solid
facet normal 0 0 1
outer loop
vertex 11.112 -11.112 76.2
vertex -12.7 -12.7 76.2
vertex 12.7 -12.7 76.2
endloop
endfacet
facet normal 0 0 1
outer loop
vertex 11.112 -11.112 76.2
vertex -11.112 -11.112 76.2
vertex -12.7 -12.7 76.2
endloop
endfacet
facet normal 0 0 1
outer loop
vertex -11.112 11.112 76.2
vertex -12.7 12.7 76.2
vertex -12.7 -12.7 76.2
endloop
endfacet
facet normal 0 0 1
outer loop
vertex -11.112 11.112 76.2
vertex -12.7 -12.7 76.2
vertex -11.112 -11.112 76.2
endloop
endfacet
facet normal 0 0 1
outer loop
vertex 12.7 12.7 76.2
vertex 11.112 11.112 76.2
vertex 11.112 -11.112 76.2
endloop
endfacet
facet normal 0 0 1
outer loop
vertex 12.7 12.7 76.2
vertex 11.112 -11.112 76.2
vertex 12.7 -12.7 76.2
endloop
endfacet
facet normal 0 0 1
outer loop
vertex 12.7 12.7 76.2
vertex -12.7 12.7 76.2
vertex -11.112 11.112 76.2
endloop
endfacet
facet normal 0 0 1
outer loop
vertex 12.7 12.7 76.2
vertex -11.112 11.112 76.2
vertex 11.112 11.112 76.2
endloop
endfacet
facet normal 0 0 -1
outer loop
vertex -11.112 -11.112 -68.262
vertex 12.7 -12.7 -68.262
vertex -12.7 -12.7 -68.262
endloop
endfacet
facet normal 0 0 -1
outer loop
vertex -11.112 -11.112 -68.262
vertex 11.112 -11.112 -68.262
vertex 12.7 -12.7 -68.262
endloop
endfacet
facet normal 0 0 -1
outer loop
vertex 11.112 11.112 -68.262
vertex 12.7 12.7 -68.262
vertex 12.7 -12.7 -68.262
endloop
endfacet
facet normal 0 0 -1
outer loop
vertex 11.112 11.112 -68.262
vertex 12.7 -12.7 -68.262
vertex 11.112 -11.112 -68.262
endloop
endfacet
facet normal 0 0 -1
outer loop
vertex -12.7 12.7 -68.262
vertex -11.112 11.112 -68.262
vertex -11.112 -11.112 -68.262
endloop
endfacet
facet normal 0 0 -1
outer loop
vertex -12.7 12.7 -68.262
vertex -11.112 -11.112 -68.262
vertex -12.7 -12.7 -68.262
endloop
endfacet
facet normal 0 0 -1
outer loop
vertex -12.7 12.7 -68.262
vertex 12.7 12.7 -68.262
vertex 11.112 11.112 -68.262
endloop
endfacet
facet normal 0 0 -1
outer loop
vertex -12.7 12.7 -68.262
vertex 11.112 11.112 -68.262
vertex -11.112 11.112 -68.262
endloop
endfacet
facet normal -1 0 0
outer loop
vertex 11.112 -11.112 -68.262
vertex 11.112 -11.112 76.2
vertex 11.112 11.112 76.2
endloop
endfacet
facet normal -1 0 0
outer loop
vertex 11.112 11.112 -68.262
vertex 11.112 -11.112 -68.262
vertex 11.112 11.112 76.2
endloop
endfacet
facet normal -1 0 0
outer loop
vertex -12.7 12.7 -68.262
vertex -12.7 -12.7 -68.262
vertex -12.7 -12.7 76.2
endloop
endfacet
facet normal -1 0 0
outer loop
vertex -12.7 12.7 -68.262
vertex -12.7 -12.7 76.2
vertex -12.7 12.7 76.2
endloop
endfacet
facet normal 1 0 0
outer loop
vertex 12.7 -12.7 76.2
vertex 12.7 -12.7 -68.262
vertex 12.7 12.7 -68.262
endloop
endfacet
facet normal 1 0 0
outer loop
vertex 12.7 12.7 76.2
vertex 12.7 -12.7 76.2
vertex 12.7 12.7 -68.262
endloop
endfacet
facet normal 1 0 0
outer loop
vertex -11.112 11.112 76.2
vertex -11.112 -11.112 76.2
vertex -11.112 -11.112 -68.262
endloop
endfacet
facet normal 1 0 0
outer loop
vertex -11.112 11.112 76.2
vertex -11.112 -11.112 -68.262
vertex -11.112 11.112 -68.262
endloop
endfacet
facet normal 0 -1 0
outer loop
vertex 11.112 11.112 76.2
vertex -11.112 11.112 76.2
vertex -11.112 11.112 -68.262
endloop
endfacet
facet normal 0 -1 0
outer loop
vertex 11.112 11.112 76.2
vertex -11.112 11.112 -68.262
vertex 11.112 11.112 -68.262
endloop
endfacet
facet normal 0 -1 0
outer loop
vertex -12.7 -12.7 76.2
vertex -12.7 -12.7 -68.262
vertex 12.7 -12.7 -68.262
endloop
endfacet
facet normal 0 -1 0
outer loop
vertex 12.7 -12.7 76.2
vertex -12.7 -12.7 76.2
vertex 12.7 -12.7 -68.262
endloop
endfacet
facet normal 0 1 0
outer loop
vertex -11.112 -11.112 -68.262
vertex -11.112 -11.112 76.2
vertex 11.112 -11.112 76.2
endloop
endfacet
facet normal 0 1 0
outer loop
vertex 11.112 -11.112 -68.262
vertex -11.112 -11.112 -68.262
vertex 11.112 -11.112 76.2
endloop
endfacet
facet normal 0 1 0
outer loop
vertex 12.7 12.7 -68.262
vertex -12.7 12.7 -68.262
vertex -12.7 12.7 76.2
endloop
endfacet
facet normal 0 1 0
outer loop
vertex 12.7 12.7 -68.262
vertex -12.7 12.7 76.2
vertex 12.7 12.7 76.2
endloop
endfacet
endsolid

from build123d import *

# Parameters (mm, degrees)
SKETCH3_W                = 25.4
SKETCH3_H                = 25.4
SKETCH3_W_2              = 22.225
SKETCH3_H_2              = 22.225
BOSS_EXTRUDE1_DEPTH      = 76.2
BOSS_EXTRUDE1_DEPTH_BACK = 76.2
SKETCH4_W                = 25.4
SKETCH4_H                = 25.4
SKETCH4_W_2              = 22.225
SKETCH4_H_2              = 22.225
CUT_EXTRUDE1_DEPTH       = 7.9375


with BuildPart() as part:
    # Sketch3 → Boss-Extrude1 (new body, two sides)
    with BuildSketch(Plane.XY) as boss_extrude1_sk:
        Rectangle(SKETCH3_W, SKETCH3_H)
        Rectangle(SKETCH3_W_2, SKETCH3_H_2, mode=Mode.SUBTRACT)
    extrude(amount=BOSS_EXTRUDE1_DEPTH)
    extrude(boss_extrude1_sk.sketch, amount=-BOSS_EXTRUDE1_DEPTH_BACK)

    # Sketch4 → Cut-Extrude1 (cut)
    with BuildSketch(Plane(origin=(0, 0, -76.2), x_dir=(-1, 0, 0), z_dir=(0, 0, -1))):
        Rectangle(SKETCH4_W, SKETCH4_H)
        Rectangle(SKETCH4_W_2, SKETCH4_H_2, mode=Mode.SUBTRACT)
    extrude(amount=-CUT_EXTRUDE1_DEPTH, mode=Mode.SUBTRACT)


solid = part.part
